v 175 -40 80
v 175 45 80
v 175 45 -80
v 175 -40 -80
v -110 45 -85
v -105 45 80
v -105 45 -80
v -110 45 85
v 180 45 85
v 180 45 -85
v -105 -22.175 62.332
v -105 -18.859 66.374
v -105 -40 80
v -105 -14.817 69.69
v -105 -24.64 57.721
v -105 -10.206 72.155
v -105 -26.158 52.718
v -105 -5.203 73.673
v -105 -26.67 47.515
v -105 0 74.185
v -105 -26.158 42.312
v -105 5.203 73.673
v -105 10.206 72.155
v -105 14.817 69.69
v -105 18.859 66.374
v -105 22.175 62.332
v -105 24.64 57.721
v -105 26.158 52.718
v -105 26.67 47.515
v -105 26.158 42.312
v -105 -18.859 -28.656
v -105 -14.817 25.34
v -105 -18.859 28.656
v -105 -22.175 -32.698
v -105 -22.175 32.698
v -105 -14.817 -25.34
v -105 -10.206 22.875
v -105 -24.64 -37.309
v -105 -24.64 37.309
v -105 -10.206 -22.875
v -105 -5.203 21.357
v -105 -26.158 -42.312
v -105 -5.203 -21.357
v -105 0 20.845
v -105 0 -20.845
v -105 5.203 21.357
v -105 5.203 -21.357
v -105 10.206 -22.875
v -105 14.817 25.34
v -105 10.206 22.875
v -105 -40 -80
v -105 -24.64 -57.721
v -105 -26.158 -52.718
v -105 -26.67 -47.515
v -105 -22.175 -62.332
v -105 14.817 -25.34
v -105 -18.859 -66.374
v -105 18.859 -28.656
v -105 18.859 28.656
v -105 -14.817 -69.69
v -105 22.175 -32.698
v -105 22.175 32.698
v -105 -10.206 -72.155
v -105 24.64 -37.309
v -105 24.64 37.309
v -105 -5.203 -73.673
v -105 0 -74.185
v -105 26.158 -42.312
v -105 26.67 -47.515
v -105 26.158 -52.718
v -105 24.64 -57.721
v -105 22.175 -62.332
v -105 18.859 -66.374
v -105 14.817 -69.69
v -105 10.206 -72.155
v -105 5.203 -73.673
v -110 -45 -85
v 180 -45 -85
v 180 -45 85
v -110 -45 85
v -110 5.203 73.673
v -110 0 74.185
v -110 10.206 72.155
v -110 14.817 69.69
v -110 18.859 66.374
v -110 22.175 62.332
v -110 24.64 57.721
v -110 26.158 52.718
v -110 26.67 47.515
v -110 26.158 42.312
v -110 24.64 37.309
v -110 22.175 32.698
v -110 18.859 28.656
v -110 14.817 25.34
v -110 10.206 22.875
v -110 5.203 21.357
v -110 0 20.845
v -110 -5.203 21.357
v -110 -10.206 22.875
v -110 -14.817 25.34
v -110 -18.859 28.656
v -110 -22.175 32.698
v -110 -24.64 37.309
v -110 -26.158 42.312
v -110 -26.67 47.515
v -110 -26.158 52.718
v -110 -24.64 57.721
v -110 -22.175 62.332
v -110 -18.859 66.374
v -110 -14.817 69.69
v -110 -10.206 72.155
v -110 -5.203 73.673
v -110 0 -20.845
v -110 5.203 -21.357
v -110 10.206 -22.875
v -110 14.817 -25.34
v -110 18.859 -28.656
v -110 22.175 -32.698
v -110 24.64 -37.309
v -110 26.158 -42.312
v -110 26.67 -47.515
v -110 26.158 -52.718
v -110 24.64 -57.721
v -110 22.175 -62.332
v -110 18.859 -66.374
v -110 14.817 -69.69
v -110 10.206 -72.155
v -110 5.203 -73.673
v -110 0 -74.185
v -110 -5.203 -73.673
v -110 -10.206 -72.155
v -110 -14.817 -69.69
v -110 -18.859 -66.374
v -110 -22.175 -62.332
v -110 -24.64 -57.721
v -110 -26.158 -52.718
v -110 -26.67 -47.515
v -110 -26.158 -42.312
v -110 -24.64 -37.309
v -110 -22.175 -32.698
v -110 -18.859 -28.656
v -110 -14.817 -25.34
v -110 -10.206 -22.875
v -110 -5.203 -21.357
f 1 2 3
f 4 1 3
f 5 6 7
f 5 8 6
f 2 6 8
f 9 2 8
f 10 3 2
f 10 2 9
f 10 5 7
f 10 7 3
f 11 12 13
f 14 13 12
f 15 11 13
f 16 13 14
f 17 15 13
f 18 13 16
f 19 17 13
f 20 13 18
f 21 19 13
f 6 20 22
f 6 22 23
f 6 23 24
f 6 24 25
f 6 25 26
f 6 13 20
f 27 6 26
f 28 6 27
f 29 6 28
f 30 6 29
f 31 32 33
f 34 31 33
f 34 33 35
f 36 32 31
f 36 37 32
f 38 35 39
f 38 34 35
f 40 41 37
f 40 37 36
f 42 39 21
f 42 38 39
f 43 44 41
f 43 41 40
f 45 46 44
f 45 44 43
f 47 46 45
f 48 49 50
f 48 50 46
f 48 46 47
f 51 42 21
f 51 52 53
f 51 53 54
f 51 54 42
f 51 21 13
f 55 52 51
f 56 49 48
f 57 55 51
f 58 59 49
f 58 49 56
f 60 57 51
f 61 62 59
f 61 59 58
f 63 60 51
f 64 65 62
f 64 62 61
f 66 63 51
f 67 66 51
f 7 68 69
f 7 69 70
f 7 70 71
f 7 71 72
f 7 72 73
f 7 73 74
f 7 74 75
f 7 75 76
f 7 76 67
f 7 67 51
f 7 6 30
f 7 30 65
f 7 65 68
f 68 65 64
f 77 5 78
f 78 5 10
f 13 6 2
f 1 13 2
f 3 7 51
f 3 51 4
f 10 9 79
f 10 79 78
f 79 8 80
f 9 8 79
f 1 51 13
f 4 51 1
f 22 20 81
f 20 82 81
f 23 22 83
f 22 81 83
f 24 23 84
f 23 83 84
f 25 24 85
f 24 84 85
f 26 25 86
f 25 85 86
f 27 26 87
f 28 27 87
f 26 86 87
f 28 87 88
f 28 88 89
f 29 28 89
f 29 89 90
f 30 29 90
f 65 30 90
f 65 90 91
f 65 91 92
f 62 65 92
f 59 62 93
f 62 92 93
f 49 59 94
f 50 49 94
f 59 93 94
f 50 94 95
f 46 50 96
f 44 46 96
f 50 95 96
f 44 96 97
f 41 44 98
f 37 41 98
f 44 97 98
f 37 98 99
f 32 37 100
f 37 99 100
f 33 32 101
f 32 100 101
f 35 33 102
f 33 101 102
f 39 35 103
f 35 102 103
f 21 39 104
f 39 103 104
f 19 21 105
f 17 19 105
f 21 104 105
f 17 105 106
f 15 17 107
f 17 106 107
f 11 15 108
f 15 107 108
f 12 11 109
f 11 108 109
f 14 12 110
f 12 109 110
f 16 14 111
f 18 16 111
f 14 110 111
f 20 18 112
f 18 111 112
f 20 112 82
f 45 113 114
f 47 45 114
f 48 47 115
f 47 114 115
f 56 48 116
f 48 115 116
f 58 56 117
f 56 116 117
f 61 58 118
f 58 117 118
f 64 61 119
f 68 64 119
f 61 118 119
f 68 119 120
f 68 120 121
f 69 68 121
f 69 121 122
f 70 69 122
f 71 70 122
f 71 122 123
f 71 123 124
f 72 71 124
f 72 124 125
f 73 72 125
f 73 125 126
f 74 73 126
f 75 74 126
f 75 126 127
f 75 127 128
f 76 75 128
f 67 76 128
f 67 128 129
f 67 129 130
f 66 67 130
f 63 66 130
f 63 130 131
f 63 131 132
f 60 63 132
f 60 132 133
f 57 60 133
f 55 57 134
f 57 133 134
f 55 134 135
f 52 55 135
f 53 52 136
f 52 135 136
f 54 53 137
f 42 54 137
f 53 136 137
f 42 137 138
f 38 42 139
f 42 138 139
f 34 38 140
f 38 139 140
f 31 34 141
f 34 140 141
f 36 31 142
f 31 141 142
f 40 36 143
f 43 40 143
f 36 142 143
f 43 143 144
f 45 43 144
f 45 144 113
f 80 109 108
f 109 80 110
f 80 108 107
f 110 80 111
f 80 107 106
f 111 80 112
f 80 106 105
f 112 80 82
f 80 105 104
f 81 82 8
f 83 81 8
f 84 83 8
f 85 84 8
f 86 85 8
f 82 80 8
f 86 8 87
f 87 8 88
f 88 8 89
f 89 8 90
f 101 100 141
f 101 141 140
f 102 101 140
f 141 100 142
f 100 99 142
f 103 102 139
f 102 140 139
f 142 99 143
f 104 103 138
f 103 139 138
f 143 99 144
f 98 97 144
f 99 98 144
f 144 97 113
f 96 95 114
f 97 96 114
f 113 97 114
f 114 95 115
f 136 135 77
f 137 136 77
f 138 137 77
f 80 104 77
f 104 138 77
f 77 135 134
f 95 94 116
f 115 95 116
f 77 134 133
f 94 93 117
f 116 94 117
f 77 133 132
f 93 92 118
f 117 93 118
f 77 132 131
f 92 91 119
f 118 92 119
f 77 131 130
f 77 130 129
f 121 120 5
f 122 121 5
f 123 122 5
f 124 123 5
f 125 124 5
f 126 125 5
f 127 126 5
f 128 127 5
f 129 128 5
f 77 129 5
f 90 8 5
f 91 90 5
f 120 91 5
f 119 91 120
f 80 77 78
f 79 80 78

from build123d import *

# Parameters (mm, degrees)
SKETCH4_W           = 290
SKETCH4_H           = 170
BOSS_EXTRUDE1_DEPTH = 45
SHELL1_T            = -5
SKETCH5_R           = 26.67
CUT_EXTRUDE1_DEPTH  = 40


with BuildPart() as part:
    # Sketch4 → Boss-Extrude1 (new body, symmetric)
    with BuildSketch(Plane(origin=(0, 0, 0), x_dir=(1, 0, 0), z_dir=(0, 1, 0))):
        with Locations((35, 0)):
            Rectangle(SKETCH4_W, SKETCH4_H)
    extrude(amount=BOSS_EXTRUDE1_DEPTH, both=True)

    # Shell1
    shell1_openings = [part.faces().sort_by_distance(p)[0] for p in [
        (35, 45, 0),
    ]]
    offset(amount=SHELL1_T, openings=shell1_openings, kind=Kind.INTERSECTION)

    # Sketch5 → Cut-Extrude1 (cut, symmetric)
    with BuildSketch(Plane.ZY.offset(110)):
        with Locations((-47.514984282, 0)):
            Circle(SKETCH5_R)
        with Locations((47.514984282, 0)):
            Circle(SKETCH5_R)
    extrude(amount=CUT_EXTRUDE1_DEPTH, both=True, mode=Mode.SUBTRACT)


solid = part.part
